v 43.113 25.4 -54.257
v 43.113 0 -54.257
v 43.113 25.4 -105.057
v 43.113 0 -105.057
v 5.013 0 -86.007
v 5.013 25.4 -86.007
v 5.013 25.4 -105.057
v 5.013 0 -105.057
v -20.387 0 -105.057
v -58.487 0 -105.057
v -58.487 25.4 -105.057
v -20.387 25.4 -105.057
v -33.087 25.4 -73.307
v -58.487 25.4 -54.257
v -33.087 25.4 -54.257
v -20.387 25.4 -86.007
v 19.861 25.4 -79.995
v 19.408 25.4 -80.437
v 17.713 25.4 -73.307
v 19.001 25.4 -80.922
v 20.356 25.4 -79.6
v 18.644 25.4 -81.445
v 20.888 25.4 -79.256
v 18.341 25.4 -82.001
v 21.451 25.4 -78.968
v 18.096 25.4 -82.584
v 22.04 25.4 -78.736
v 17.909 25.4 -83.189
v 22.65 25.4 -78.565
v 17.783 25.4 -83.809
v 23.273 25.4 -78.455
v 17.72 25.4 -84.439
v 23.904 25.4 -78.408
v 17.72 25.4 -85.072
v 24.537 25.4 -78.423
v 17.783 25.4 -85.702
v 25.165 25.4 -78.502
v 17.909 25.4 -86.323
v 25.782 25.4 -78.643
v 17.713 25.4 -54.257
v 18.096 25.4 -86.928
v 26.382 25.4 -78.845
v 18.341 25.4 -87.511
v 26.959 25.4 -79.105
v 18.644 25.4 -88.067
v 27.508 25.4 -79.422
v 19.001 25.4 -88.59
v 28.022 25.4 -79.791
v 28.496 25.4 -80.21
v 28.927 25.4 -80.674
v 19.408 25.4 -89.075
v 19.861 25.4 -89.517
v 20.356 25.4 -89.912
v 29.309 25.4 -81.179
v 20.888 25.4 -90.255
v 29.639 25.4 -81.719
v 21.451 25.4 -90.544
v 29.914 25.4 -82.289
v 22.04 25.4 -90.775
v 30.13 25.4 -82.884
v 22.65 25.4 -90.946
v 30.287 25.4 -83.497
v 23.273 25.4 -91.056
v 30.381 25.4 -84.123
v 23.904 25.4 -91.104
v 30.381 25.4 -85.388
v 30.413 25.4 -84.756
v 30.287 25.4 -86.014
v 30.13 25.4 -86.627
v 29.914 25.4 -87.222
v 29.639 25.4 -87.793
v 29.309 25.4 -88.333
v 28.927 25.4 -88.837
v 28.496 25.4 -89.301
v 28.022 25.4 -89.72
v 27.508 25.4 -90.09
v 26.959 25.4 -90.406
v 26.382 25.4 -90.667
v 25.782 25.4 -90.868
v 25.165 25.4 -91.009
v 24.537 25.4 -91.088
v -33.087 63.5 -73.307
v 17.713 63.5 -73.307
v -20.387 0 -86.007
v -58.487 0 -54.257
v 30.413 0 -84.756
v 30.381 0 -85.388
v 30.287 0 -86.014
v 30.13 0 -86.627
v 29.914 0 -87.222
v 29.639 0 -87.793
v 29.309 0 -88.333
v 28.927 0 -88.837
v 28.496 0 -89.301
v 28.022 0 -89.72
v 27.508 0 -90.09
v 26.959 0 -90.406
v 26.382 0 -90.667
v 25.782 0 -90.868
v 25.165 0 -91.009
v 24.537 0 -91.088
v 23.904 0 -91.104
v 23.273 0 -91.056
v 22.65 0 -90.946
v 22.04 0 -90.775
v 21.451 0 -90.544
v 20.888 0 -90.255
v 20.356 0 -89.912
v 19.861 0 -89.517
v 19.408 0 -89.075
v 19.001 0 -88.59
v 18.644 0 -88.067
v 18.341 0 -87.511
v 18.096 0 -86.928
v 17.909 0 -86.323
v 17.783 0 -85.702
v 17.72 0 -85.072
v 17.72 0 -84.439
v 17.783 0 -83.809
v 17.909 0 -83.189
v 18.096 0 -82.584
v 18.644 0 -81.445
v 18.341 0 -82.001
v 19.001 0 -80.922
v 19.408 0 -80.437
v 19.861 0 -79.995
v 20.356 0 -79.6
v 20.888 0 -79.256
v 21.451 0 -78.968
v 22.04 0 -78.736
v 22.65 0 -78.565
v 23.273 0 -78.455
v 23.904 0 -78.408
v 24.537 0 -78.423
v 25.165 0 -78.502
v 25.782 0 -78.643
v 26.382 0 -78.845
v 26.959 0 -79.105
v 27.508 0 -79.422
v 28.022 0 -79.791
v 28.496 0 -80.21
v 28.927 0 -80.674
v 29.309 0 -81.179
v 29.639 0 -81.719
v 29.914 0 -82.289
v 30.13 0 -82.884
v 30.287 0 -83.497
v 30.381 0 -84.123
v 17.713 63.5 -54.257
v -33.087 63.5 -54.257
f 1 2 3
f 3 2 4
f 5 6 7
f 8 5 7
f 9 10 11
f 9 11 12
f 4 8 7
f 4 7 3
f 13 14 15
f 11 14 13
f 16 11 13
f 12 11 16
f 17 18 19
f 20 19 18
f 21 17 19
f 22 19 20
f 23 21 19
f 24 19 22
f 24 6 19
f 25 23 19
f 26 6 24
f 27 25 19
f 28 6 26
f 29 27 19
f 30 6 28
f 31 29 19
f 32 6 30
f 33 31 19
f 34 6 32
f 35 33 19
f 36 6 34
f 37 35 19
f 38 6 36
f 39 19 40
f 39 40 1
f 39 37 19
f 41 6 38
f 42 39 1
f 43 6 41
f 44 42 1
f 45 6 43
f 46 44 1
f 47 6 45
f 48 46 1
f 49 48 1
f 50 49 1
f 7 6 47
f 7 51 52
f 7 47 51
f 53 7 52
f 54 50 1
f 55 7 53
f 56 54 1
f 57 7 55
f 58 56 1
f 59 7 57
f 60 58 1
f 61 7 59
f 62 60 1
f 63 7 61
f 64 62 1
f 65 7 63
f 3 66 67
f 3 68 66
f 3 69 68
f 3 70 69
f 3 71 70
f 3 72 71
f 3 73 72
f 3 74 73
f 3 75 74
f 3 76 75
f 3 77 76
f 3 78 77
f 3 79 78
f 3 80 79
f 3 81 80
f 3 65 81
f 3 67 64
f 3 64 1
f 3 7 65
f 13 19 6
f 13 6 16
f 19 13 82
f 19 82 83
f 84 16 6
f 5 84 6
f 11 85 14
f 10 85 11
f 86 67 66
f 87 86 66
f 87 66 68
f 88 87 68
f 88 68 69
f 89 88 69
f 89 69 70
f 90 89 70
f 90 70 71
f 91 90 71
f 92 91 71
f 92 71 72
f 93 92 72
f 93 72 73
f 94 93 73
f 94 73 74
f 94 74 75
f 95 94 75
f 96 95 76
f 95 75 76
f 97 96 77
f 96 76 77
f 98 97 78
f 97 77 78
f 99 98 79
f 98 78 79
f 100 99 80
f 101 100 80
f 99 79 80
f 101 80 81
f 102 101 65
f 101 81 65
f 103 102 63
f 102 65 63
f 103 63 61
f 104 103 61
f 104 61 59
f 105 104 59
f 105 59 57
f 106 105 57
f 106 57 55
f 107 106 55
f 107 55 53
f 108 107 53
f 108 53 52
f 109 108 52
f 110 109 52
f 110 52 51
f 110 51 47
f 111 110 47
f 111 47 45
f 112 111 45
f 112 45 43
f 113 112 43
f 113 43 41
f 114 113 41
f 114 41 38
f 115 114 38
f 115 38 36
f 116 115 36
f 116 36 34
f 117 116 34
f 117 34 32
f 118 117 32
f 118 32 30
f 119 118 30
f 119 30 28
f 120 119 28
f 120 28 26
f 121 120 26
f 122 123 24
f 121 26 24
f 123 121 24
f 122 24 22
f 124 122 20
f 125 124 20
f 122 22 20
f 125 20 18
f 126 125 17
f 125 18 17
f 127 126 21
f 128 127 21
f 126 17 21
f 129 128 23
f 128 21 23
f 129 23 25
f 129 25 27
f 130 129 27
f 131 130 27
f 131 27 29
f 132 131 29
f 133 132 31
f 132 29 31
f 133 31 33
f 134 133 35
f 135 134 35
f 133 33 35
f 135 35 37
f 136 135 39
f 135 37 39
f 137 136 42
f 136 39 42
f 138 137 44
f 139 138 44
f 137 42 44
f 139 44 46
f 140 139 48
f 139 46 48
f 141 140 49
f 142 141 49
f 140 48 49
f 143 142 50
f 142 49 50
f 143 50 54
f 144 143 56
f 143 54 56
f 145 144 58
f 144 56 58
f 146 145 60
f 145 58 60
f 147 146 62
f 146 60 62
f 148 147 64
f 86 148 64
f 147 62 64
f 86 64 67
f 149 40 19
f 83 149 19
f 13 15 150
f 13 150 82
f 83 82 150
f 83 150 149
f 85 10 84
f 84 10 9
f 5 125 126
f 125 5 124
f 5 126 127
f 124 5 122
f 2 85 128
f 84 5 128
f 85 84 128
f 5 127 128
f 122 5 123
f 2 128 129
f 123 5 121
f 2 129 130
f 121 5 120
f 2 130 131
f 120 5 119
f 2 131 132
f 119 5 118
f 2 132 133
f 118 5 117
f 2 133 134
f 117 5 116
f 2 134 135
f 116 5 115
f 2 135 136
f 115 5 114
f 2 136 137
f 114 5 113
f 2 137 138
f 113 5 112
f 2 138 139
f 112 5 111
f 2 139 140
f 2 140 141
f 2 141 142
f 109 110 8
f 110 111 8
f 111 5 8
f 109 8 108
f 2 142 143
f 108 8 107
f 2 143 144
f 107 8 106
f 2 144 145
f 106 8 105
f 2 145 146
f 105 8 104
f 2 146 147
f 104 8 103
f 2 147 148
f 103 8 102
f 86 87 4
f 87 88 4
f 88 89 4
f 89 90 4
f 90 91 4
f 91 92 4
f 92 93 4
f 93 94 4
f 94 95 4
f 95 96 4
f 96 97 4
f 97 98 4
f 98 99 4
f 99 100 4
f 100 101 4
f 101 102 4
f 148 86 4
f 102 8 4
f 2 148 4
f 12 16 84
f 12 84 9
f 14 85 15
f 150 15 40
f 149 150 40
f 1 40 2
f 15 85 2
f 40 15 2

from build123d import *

# Parameters (mm, degrees)
SKETCH1_W           = 101.6
SKETCH1_H           = 50.8
BOSS_EXTRUDE1_DEPTH = 25.4
SKETCH2_W           = 25.4
SKETCH2_H           = 19.05
CUT_EXTRUDE1_DEPTH  = 26.4
SKETCH5_W           = 50.8
SKETCH5_H           = 19.05
BOSS_EXTRUDE3_DEPTH = 38.1
SKETCH7_R           = 6.35
CUT_EXTRUDE2_DEPTH  = 26.4


with BuildPart() as part:
    # Sketch1 → Boss-Extrude1 (new body)
    with BuildSketch(Plane(origin=(0, 0, 0), x_dir=(1, 0, 0), z_dir=(0, 1, 0))):
        with Locations((-7.687438987, 79.657257194)):
            Rectangle(SKETCH1_W, SKETCH1_H)
    extrude(amount=BOSS_EXTRUDE1_DEPTH)

    # Sketch2 → Cut-Extrude1 (cut, through all)
    with BuildSketch(Plane(origin=(0, 25.4, 0), x_dir=(1, 0, 0), z_dir=(0, 1, 0))):
        with Locations((-7.687438987, 95.532257194)):
            Rectangle(SKETCH2_W, SKETCH2_H)
    extrude(amount=-CUT_EXTRUDE1_DEPTH, mode=Mode.SUBTRACT)

    # Sketch5 → Boss-Extrude3 (add)
    with BuildSketch(Plane(origin=(0, 25.4, 0), x_dir=(1, 0, 0), z_dir=(0, 1, 0))):
        with Locations((-7.687438987, 63.782257194)):
            Rectangle(SKETCH5_W, SKETCH5_H)
    extrude(amount=BOSS_EXTRUDE3_DEPTH)

    # Sketch7 → Cut-Extrude2 (cut, through all)
    with BuildSketch(Plane(origin=(0, 25.4, 0), x_dir=(1, 0, 0), z_dir=(0, 1, 0))):
        with Locations((24.062561013, 84.755702101)):
            Circle(SKETCH7_R)
    extrude(amount=-CUT_EXTRUDE2_DEPTH, mode=Mode.SUBTRACT)


solid = part.part
